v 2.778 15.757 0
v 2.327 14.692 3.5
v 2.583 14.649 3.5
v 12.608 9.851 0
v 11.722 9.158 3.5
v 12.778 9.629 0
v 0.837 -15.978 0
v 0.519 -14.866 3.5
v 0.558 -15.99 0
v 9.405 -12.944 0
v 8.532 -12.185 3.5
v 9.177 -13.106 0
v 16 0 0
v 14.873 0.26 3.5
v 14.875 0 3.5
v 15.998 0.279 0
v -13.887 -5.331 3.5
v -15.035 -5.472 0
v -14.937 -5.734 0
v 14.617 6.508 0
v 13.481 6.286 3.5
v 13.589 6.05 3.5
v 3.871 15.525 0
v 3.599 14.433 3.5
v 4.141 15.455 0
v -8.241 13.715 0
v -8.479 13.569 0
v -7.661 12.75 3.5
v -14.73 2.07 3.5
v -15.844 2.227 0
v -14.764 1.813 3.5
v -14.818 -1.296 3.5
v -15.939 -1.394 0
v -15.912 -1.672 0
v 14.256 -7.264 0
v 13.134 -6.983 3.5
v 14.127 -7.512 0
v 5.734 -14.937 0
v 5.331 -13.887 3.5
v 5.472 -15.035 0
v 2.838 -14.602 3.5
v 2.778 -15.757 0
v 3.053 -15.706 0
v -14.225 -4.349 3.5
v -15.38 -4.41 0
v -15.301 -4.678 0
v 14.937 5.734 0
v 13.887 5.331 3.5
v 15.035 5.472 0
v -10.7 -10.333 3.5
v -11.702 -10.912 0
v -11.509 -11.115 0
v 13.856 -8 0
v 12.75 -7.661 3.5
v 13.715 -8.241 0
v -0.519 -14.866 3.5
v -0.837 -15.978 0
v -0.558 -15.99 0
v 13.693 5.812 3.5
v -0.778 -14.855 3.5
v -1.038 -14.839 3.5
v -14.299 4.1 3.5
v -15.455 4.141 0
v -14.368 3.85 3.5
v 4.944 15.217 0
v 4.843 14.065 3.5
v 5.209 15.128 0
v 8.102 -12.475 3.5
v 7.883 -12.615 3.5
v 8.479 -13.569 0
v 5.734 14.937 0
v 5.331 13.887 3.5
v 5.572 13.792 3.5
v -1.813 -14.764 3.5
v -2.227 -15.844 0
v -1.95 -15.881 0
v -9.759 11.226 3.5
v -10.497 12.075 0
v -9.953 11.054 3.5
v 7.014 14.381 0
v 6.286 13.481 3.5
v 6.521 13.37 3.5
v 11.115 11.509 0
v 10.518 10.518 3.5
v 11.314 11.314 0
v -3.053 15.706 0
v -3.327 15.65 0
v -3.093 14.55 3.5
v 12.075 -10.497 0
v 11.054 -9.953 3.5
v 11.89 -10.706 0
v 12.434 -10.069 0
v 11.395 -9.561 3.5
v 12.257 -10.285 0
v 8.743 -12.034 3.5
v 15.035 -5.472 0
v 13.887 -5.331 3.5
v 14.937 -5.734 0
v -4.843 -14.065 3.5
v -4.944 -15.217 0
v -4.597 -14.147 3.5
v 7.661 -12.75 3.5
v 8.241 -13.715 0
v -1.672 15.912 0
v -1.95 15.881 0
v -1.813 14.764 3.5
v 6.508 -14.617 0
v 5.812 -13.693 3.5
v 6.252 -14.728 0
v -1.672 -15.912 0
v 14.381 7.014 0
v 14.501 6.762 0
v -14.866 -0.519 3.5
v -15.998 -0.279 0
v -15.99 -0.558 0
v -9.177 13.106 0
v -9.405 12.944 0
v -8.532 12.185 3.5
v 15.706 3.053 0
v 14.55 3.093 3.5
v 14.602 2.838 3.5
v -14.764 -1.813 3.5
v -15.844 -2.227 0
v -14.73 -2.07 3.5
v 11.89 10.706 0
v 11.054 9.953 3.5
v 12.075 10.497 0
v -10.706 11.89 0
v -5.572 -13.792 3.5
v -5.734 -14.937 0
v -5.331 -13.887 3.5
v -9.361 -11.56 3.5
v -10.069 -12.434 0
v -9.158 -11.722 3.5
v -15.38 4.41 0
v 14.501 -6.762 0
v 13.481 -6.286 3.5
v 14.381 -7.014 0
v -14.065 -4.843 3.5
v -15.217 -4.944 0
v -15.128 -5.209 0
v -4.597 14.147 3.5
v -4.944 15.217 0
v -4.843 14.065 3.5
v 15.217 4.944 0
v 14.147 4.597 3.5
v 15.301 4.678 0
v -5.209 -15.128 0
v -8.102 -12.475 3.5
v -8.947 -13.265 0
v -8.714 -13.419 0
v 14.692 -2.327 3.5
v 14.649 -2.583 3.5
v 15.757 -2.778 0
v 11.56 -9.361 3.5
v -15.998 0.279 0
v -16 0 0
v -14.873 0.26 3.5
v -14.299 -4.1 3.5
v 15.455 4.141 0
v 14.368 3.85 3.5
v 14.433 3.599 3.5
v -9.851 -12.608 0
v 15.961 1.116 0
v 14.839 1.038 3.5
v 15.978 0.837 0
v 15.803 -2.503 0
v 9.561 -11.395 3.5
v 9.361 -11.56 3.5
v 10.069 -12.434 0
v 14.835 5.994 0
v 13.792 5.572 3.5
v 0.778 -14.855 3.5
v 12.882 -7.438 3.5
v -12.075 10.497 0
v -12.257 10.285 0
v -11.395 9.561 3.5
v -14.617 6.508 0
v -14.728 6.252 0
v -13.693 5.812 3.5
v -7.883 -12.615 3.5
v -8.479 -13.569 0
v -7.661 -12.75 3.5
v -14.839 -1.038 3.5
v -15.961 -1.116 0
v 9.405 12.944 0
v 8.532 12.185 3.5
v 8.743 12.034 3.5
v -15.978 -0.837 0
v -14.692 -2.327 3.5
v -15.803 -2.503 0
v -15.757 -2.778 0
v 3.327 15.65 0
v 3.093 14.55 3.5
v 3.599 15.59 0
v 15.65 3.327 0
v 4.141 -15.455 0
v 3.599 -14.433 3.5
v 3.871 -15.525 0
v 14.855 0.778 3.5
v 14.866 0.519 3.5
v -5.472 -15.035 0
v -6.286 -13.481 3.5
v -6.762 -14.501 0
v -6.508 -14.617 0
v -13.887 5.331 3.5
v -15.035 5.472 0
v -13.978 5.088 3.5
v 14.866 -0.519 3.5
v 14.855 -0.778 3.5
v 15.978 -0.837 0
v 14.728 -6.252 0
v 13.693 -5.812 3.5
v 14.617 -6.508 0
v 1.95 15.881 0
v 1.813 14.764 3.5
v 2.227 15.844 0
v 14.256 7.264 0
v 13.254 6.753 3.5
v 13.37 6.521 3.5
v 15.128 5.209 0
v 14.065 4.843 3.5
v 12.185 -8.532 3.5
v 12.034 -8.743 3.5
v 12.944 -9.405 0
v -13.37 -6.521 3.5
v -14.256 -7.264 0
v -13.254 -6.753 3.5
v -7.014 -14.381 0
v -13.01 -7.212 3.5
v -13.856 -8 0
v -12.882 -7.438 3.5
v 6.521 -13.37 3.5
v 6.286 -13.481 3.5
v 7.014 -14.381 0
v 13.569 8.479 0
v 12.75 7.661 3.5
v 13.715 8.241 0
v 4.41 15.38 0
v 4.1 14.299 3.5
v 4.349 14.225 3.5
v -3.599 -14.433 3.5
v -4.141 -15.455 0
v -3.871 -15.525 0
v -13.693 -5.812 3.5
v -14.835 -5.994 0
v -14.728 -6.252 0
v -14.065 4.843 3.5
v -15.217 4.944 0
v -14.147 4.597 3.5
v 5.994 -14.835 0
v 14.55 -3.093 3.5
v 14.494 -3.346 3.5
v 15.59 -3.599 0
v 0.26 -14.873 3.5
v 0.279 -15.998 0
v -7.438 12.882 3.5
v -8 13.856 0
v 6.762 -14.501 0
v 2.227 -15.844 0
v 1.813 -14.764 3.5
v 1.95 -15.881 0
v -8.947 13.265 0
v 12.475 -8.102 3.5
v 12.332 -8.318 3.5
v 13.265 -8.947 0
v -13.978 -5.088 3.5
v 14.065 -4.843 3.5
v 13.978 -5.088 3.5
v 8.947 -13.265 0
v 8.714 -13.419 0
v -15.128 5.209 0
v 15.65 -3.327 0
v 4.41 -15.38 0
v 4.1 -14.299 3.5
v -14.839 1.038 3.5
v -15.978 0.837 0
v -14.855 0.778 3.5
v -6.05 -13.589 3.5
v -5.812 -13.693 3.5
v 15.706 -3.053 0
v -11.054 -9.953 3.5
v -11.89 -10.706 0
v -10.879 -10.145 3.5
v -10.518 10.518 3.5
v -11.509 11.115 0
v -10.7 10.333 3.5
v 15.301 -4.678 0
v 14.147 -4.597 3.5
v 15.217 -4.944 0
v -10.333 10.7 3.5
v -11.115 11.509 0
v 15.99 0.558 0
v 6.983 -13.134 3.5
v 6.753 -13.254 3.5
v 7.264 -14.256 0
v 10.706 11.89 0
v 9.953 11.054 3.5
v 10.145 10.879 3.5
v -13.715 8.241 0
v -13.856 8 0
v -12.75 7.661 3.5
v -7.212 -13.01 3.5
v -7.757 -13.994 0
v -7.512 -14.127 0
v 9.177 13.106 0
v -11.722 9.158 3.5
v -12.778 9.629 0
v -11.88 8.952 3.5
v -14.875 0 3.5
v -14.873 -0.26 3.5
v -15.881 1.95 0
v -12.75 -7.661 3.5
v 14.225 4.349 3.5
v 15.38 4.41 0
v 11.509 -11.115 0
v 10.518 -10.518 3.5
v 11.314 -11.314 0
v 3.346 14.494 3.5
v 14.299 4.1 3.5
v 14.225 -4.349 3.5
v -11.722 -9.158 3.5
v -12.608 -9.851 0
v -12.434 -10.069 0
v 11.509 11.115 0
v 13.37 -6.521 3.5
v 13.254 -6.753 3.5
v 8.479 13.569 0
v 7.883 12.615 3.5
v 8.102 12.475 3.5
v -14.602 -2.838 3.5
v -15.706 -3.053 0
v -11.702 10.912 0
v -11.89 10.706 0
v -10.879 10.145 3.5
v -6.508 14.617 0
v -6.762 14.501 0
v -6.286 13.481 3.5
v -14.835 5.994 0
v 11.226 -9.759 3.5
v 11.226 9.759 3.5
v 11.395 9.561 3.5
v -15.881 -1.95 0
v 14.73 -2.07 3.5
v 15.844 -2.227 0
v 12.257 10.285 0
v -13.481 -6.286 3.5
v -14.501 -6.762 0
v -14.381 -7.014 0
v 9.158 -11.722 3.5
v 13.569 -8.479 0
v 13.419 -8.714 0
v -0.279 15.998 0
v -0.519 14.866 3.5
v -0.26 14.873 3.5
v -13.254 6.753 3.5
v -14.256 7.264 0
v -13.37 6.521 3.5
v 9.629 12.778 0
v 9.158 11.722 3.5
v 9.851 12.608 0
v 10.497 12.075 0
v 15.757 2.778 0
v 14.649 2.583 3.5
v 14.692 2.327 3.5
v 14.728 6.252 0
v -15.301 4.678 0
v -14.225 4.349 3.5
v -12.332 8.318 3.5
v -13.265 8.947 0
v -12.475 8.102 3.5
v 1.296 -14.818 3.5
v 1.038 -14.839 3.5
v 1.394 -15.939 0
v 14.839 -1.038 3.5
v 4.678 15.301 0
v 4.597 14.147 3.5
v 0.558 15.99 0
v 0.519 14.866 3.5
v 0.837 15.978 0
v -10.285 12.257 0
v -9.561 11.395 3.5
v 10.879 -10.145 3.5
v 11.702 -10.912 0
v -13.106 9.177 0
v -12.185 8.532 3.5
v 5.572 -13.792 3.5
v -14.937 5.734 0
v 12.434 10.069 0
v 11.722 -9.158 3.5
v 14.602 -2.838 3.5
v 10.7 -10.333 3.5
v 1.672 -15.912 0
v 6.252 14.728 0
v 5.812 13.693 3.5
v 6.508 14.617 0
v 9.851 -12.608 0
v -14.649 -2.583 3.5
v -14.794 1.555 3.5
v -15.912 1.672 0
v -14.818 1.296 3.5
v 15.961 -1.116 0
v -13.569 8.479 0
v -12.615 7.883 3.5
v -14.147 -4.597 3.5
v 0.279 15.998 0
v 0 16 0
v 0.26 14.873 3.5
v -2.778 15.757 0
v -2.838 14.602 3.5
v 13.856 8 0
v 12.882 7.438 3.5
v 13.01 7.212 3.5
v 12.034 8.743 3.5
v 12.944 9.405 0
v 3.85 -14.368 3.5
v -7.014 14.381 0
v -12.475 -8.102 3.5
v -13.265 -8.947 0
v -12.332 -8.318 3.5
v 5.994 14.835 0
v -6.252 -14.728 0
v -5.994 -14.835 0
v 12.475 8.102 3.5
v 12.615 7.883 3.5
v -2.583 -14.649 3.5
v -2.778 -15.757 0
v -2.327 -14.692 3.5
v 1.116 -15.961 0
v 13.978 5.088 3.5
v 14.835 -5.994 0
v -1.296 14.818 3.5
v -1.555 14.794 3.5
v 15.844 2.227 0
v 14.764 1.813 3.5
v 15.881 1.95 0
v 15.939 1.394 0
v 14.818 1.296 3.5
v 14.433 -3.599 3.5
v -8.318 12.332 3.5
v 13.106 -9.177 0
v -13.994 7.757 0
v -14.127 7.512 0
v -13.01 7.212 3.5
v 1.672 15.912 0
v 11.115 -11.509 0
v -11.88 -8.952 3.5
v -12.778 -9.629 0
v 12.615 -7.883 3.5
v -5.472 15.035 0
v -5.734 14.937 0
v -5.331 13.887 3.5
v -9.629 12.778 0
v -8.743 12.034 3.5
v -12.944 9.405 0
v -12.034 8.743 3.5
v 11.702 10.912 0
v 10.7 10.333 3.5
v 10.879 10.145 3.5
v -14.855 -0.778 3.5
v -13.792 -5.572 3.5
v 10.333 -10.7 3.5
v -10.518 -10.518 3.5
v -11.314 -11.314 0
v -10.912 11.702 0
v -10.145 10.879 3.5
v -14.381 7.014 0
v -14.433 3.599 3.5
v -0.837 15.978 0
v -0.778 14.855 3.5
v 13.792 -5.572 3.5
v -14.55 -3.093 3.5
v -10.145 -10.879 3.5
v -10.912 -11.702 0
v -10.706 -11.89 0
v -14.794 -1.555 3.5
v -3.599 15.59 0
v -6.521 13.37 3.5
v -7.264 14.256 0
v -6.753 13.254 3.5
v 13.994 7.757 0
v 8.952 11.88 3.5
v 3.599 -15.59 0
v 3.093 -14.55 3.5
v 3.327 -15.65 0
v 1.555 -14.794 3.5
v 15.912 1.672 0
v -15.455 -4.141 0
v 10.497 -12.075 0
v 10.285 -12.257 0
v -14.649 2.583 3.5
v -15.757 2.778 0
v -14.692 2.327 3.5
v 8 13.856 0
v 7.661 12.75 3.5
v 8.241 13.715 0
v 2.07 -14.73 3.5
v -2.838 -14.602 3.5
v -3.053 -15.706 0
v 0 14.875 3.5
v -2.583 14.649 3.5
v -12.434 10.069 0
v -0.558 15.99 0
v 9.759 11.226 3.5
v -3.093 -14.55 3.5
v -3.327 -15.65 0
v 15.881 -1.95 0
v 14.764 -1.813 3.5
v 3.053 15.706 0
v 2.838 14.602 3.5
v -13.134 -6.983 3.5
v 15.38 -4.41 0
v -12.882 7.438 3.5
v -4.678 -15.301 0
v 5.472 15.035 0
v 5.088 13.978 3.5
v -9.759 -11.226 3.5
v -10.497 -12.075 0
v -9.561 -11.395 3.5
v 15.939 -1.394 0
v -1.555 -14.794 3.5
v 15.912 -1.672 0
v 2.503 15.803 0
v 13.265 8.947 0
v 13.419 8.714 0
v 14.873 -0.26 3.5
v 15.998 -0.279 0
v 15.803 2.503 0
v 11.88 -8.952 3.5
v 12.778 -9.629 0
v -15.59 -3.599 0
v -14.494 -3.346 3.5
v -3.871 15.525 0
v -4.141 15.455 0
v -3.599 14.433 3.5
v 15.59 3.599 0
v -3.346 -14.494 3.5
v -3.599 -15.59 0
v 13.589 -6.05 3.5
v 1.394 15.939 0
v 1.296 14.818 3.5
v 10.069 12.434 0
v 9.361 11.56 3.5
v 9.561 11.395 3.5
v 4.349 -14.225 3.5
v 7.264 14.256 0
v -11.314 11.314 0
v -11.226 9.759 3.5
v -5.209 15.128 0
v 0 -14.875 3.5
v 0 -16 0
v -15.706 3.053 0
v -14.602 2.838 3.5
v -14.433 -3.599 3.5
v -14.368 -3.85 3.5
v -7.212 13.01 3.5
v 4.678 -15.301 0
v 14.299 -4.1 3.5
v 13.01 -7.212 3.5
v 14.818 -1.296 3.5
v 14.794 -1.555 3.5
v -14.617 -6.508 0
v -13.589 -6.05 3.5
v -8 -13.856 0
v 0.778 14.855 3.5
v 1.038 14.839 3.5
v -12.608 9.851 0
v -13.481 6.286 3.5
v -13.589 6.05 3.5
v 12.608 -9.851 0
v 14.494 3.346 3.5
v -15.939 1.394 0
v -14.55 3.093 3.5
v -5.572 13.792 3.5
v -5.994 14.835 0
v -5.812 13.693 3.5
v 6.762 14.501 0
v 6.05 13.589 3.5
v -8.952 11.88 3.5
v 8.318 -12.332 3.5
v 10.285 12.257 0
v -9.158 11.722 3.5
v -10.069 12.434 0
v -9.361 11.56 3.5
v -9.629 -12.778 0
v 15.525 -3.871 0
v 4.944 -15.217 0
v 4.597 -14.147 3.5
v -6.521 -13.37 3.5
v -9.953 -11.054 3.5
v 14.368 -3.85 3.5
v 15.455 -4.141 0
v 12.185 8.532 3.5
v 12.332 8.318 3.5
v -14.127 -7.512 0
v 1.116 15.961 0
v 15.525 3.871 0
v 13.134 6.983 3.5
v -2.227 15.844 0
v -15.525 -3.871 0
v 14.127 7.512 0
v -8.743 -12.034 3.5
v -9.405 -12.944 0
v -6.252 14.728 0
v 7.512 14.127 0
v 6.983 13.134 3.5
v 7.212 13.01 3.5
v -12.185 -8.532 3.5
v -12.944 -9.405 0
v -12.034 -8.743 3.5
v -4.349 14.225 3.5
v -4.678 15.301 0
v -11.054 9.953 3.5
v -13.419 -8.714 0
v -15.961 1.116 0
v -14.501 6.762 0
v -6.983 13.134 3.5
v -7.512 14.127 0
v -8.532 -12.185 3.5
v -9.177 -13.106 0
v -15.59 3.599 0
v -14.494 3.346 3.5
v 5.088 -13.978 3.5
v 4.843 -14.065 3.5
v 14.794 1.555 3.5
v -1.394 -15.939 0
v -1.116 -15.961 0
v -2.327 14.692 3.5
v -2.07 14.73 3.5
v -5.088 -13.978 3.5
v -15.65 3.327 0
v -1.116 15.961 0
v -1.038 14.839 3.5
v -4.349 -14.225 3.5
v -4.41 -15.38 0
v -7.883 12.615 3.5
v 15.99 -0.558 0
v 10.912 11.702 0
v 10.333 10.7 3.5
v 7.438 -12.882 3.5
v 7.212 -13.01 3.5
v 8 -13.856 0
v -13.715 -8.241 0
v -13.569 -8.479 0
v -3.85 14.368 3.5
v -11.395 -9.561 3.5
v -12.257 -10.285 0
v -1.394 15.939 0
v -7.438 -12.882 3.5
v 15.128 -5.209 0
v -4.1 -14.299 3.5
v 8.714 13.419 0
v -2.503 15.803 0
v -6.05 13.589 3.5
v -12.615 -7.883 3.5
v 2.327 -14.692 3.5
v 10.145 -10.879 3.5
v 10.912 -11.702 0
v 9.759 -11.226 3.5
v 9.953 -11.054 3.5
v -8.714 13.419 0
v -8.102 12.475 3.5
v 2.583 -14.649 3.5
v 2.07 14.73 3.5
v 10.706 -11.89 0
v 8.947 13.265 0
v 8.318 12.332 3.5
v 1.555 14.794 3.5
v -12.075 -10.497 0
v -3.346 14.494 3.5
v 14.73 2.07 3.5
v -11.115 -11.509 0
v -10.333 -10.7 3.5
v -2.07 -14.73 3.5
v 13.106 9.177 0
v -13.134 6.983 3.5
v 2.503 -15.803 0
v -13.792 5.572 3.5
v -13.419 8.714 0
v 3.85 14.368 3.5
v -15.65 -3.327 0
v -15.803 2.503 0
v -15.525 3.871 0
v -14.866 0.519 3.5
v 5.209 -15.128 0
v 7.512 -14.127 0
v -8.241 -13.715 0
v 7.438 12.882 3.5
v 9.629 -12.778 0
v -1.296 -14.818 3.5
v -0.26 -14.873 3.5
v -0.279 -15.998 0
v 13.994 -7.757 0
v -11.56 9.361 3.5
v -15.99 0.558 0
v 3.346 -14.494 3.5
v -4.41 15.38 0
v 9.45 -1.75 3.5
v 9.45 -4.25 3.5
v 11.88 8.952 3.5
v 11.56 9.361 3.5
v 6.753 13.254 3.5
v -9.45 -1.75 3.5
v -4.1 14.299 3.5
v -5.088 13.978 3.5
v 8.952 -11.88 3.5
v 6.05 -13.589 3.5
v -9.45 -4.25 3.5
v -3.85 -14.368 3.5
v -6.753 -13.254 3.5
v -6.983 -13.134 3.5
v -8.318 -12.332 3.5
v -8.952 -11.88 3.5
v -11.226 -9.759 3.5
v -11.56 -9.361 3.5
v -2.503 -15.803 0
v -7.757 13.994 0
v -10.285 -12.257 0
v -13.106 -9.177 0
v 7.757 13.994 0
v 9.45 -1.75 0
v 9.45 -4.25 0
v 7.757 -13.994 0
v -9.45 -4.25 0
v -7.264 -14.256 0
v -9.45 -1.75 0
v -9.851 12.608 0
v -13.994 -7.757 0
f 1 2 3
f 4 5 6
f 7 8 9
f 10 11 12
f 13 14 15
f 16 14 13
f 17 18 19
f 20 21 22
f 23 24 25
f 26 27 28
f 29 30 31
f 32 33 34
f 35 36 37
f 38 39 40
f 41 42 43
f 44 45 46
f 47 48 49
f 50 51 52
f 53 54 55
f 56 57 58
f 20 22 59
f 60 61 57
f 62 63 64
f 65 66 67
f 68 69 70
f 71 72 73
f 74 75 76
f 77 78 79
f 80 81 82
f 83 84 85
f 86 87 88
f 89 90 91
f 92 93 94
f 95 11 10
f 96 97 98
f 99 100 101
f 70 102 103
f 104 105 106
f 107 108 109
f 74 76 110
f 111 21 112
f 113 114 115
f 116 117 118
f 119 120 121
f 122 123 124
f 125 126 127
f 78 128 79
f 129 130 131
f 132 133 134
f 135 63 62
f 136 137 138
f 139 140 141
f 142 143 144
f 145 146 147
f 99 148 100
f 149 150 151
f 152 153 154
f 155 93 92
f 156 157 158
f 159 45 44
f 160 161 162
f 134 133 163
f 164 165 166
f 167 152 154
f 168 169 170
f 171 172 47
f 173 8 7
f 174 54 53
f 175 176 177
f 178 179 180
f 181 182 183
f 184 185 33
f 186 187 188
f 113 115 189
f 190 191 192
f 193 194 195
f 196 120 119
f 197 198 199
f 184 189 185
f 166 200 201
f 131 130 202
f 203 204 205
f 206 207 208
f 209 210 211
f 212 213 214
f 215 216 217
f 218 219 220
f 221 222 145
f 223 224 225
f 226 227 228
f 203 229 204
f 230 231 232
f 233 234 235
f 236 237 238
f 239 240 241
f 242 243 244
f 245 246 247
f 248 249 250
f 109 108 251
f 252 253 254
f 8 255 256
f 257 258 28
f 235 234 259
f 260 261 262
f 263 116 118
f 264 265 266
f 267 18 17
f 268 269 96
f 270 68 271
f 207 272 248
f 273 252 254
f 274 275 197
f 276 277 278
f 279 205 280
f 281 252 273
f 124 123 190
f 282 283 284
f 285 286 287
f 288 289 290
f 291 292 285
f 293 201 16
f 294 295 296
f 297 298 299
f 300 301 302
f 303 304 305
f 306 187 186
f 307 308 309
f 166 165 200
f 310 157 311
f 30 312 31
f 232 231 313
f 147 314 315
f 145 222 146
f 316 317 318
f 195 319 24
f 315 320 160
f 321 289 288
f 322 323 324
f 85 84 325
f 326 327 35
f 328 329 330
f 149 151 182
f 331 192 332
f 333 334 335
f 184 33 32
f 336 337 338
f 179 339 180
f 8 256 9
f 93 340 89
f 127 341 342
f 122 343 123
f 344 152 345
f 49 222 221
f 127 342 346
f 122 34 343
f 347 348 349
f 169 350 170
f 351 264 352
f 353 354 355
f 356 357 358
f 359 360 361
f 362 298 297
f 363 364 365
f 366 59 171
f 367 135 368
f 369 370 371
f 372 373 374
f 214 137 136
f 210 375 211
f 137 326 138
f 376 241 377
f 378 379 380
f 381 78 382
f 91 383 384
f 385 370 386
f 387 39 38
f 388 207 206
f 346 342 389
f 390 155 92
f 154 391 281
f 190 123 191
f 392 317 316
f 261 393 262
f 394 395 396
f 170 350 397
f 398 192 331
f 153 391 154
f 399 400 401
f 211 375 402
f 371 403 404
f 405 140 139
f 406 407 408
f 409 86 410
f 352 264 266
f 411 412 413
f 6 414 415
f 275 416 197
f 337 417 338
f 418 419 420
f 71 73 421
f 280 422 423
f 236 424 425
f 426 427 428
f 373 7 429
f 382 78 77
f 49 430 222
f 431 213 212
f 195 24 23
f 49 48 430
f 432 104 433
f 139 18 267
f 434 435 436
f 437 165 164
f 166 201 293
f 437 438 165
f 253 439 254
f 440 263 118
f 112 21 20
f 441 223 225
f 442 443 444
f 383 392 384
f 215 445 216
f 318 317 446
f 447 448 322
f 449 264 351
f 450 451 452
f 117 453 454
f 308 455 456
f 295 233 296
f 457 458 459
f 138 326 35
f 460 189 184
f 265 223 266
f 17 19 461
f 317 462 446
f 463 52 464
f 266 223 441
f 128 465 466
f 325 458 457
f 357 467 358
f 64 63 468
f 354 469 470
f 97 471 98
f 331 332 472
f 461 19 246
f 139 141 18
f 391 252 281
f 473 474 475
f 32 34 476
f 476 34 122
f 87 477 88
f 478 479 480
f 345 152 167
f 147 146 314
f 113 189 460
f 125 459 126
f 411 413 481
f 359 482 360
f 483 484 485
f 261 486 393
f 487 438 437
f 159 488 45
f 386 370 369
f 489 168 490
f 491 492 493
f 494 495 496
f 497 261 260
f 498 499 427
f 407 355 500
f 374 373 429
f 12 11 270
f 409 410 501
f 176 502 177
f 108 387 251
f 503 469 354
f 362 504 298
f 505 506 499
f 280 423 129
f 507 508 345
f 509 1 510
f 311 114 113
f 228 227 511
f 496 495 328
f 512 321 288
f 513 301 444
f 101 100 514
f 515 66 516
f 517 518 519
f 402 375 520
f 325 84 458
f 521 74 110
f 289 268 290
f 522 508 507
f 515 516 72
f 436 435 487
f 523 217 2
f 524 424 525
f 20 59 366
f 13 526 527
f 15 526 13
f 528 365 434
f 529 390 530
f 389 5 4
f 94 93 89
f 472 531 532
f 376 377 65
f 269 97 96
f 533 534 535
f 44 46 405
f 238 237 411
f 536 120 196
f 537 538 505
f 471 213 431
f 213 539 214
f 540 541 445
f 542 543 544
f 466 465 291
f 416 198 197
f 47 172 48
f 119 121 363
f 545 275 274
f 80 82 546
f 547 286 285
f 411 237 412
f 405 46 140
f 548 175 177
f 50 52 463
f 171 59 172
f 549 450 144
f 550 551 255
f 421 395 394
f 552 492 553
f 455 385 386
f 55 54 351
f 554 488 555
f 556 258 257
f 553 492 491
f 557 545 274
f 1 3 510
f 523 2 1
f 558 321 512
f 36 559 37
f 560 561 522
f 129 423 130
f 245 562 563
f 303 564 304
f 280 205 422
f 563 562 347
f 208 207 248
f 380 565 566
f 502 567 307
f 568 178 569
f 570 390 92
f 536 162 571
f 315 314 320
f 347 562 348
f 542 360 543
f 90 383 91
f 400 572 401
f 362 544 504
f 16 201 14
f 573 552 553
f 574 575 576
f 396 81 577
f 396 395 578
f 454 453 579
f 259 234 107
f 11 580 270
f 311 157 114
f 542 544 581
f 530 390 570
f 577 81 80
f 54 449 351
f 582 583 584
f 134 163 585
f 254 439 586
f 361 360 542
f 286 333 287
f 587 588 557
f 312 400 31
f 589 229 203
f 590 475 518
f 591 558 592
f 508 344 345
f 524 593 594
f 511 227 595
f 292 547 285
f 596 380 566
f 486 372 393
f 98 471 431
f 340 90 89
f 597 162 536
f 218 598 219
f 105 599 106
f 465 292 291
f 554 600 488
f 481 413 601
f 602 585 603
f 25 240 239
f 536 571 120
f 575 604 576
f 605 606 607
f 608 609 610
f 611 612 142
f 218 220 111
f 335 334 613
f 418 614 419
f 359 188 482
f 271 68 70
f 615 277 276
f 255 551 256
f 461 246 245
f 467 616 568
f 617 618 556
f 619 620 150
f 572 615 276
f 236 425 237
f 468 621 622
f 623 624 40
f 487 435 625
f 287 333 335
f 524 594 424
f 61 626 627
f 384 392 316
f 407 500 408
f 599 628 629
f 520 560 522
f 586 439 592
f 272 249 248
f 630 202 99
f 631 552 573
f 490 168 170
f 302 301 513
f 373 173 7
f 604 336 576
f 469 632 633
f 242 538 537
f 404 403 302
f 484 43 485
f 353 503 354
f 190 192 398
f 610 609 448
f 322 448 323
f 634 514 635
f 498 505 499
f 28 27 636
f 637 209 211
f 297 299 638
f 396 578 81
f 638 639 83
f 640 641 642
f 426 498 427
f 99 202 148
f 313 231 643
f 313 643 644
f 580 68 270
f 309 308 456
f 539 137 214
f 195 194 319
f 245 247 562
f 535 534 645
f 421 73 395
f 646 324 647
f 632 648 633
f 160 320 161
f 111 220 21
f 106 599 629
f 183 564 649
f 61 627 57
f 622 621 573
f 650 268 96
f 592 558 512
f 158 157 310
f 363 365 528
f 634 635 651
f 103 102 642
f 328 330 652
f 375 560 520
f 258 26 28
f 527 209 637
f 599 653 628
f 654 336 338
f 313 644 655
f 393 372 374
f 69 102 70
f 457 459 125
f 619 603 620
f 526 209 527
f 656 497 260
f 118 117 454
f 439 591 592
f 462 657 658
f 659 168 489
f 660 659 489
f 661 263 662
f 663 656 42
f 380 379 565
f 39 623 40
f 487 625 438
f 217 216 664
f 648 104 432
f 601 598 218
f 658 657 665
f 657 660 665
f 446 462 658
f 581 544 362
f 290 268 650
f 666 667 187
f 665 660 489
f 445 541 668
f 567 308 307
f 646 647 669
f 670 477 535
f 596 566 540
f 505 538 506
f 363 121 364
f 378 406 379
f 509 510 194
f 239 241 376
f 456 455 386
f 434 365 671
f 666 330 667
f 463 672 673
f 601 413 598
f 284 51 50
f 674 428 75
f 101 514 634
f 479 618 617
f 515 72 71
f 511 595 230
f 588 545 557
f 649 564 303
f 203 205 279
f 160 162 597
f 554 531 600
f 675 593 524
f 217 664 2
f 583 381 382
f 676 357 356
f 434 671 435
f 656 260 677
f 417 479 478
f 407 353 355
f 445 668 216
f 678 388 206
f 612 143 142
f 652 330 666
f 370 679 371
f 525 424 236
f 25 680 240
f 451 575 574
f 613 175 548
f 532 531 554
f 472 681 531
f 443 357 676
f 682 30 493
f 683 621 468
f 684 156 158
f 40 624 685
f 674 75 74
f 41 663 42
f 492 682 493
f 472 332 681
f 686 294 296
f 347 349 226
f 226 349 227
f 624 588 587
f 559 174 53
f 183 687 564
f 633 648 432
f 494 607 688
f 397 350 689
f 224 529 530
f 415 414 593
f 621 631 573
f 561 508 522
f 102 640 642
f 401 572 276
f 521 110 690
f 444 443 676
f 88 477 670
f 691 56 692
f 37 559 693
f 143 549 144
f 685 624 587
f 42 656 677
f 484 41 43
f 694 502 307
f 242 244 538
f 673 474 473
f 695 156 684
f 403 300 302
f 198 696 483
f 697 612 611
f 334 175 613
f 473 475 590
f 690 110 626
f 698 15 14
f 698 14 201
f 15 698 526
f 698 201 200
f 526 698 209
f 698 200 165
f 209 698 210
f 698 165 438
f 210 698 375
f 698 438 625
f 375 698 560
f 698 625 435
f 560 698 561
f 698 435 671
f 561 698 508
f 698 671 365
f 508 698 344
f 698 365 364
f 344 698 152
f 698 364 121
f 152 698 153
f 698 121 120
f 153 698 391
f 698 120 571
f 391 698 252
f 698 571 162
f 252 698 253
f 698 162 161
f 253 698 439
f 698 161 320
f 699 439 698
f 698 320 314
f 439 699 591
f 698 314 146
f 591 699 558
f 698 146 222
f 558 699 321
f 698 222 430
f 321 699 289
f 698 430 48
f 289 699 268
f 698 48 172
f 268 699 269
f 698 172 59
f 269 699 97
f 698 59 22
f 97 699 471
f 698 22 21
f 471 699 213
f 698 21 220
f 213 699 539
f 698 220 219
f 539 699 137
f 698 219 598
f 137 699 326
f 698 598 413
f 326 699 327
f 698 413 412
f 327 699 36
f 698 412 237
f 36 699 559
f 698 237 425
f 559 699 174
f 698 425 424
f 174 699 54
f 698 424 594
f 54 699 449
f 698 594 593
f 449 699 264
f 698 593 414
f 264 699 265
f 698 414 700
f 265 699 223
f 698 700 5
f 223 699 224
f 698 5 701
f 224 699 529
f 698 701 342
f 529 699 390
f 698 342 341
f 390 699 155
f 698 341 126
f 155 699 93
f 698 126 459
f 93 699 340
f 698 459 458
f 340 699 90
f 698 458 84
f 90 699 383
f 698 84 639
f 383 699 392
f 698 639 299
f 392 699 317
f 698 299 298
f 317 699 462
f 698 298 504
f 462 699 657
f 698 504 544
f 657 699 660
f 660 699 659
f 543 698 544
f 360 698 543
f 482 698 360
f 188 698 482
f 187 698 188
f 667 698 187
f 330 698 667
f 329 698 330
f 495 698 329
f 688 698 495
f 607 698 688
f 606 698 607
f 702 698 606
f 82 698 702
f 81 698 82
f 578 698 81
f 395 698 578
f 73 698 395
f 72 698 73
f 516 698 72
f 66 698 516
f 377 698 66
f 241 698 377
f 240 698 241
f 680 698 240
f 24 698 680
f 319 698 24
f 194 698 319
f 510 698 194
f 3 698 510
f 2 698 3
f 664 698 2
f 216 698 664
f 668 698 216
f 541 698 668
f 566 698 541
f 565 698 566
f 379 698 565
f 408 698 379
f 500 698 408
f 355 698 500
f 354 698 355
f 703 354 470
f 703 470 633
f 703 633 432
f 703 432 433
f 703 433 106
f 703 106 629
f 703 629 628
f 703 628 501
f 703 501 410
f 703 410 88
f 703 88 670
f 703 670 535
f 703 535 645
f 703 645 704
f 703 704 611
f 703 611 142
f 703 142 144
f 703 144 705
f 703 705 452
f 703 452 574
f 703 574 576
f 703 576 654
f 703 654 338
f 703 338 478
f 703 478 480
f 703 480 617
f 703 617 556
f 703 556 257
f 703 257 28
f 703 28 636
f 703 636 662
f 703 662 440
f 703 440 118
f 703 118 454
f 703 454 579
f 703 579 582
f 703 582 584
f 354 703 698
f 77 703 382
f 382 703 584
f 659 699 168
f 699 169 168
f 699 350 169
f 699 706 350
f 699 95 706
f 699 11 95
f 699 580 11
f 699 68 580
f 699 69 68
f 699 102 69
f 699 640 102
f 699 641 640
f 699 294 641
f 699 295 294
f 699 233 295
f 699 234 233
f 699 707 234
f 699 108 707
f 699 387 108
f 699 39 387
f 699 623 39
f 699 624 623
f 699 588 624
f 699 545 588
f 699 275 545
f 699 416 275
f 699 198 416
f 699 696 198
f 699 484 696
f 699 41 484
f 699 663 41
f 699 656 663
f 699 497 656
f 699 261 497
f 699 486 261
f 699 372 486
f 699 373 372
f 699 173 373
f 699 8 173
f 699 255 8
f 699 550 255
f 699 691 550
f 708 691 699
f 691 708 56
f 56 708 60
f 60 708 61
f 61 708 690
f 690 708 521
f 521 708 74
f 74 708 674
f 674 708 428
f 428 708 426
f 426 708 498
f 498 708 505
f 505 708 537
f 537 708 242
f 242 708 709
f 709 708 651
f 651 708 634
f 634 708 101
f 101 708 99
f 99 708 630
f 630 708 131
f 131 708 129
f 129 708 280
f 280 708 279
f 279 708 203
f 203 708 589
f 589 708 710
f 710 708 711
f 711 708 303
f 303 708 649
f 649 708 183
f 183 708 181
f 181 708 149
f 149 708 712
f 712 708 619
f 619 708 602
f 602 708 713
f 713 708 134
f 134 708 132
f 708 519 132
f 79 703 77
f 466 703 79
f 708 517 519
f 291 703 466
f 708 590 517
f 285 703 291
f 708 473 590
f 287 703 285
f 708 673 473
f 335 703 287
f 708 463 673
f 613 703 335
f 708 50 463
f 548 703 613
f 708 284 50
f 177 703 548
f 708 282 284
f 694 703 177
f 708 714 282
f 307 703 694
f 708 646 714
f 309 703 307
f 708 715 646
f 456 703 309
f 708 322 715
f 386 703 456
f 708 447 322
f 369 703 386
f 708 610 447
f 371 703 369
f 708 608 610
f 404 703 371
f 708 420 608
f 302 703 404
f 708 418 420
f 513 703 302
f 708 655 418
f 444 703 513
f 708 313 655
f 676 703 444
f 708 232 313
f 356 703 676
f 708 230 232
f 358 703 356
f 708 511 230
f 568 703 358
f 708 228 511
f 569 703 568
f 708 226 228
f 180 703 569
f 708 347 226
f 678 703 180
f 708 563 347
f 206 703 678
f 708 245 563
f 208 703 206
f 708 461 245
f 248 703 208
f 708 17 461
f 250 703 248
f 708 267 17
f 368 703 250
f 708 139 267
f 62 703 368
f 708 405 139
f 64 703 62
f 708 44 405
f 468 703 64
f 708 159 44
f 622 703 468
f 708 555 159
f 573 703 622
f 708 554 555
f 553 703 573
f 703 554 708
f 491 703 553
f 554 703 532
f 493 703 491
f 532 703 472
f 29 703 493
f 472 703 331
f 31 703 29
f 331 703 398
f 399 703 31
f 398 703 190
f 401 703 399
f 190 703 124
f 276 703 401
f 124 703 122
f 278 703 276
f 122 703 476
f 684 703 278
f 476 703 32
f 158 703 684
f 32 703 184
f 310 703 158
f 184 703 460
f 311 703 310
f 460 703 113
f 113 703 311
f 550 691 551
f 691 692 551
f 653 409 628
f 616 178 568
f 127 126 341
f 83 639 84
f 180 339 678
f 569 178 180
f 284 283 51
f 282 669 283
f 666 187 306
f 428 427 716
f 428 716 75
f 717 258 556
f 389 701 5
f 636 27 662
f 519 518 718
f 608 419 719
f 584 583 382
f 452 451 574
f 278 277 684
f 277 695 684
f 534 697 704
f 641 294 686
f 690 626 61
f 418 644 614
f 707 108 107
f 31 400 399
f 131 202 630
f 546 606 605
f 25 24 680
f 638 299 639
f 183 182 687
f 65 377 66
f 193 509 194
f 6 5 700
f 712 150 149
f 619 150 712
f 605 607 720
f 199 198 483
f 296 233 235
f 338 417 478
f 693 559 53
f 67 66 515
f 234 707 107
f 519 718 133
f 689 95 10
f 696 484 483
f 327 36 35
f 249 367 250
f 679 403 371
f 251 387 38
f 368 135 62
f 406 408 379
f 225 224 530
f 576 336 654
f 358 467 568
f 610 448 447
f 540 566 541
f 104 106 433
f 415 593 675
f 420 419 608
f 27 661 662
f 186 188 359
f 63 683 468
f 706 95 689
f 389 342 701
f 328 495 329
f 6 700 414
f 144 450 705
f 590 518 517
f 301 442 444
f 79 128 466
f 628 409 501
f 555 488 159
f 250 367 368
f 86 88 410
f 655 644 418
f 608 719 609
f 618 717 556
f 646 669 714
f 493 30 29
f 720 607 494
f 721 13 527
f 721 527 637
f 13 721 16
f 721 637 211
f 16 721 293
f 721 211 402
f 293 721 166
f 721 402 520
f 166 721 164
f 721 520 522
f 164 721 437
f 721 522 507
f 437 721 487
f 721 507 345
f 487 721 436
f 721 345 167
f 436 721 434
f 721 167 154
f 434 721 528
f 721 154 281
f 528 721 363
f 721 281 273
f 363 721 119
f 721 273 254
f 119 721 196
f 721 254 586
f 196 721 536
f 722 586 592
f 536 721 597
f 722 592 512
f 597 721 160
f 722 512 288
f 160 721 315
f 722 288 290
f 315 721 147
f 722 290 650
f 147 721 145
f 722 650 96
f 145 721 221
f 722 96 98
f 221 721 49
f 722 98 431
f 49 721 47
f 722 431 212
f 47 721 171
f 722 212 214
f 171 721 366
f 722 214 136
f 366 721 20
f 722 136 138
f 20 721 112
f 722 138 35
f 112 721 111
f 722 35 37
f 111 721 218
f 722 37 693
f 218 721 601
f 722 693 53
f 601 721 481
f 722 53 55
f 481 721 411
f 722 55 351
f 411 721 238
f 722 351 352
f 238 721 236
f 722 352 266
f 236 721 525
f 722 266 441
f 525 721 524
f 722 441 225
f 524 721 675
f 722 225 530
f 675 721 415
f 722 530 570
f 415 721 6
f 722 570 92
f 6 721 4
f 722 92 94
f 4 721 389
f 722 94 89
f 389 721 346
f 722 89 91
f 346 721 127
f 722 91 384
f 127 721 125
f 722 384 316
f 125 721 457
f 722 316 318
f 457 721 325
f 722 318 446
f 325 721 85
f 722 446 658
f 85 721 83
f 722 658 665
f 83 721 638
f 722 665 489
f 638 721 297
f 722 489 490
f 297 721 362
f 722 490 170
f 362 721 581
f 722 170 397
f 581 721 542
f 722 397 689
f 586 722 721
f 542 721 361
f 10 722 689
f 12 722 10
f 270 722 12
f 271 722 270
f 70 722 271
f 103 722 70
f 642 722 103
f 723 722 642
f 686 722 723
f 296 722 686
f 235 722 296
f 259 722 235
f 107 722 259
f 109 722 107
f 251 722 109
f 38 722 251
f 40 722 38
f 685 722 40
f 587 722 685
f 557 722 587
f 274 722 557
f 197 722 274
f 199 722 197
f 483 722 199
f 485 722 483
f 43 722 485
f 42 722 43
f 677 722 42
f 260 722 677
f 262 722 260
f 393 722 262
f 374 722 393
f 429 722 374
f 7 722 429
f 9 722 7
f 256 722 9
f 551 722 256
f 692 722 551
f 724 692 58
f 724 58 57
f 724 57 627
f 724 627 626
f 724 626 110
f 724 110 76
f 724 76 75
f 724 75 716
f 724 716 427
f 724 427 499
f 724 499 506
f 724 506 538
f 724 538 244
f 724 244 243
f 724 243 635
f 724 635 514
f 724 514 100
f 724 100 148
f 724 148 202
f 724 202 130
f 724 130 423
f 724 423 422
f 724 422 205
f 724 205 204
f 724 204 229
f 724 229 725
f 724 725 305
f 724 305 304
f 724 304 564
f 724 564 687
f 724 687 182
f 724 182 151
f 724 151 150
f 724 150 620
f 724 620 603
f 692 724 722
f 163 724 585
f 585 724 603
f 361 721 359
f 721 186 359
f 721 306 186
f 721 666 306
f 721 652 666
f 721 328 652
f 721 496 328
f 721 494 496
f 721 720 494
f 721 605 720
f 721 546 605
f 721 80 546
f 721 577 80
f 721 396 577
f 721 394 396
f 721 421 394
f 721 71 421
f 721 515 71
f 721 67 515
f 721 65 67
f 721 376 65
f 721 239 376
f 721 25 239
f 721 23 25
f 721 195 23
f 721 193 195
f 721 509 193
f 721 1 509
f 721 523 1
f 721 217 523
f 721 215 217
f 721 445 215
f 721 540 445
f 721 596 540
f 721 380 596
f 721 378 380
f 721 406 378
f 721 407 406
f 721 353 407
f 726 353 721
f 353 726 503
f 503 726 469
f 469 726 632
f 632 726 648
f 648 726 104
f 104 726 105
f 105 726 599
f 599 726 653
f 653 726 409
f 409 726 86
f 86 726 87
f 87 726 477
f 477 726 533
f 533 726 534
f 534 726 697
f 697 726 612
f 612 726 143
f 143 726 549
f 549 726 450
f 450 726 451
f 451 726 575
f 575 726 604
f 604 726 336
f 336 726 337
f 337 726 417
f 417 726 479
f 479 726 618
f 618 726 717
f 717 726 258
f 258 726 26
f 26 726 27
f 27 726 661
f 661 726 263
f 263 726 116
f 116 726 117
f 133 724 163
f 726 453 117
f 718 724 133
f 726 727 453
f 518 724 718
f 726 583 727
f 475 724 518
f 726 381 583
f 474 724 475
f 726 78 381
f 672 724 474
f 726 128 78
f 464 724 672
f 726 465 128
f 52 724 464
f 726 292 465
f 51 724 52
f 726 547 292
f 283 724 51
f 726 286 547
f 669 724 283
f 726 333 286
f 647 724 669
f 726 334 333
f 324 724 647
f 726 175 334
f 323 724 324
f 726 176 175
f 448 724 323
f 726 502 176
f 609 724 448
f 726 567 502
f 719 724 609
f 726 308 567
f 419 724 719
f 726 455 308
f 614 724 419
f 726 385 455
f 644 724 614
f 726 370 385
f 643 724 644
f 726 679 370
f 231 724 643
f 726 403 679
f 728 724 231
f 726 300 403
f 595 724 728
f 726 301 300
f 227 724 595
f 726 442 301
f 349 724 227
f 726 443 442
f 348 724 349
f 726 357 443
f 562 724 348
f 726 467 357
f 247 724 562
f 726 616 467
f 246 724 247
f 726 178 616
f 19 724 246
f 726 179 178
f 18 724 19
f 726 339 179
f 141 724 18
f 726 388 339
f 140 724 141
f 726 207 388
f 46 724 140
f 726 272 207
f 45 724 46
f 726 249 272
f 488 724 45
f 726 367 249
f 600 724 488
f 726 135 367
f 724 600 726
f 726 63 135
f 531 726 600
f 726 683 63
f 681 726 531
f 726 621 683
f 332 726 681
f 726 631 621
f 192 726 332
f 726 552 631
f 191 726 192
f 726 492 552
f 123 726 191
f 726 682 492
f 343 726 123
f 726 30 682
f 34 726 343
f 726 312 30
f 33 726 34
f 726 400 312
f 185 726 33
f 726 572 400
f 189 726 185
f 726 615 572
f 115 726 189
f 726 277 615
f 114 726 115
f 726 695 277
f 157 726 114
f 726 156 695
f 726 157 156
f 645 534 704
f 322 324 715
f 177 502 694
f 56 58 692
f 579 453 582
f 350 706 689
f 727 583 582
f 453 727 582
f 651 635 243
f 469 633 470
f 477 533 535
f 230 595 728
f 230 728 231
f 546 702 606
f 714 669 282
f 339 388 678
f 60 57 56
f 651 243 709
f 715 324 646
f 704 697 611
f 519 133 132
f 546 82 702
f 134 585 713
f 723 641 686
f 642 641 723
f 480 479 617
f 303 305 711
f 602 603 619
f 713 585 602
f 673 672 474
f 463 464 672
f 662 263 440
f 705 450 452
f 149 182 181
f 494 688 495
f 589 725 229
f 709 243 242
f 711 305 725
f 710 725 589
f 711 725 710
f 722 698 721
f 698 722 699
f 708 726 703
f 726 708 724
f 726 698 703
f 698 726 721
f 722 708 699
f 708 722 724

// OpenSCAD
module ellipse_base(x, y,z, slot=[], shift=[0,0]) {
    difference() {
    scale([y/x, 1.0,1.0])
        cylinder(d1=x,d2=x-2.25,h=z, $fs=0.2, $fa=1);
        if (slot != []) {
            translate([shift[0],shift[1],z/2])
            cube([slot[0], slot[1], z+4], center=true);
        }
    }
}

ellipse_base(32,32, 3.5, [18.9, 2.5], [0, -3]);
